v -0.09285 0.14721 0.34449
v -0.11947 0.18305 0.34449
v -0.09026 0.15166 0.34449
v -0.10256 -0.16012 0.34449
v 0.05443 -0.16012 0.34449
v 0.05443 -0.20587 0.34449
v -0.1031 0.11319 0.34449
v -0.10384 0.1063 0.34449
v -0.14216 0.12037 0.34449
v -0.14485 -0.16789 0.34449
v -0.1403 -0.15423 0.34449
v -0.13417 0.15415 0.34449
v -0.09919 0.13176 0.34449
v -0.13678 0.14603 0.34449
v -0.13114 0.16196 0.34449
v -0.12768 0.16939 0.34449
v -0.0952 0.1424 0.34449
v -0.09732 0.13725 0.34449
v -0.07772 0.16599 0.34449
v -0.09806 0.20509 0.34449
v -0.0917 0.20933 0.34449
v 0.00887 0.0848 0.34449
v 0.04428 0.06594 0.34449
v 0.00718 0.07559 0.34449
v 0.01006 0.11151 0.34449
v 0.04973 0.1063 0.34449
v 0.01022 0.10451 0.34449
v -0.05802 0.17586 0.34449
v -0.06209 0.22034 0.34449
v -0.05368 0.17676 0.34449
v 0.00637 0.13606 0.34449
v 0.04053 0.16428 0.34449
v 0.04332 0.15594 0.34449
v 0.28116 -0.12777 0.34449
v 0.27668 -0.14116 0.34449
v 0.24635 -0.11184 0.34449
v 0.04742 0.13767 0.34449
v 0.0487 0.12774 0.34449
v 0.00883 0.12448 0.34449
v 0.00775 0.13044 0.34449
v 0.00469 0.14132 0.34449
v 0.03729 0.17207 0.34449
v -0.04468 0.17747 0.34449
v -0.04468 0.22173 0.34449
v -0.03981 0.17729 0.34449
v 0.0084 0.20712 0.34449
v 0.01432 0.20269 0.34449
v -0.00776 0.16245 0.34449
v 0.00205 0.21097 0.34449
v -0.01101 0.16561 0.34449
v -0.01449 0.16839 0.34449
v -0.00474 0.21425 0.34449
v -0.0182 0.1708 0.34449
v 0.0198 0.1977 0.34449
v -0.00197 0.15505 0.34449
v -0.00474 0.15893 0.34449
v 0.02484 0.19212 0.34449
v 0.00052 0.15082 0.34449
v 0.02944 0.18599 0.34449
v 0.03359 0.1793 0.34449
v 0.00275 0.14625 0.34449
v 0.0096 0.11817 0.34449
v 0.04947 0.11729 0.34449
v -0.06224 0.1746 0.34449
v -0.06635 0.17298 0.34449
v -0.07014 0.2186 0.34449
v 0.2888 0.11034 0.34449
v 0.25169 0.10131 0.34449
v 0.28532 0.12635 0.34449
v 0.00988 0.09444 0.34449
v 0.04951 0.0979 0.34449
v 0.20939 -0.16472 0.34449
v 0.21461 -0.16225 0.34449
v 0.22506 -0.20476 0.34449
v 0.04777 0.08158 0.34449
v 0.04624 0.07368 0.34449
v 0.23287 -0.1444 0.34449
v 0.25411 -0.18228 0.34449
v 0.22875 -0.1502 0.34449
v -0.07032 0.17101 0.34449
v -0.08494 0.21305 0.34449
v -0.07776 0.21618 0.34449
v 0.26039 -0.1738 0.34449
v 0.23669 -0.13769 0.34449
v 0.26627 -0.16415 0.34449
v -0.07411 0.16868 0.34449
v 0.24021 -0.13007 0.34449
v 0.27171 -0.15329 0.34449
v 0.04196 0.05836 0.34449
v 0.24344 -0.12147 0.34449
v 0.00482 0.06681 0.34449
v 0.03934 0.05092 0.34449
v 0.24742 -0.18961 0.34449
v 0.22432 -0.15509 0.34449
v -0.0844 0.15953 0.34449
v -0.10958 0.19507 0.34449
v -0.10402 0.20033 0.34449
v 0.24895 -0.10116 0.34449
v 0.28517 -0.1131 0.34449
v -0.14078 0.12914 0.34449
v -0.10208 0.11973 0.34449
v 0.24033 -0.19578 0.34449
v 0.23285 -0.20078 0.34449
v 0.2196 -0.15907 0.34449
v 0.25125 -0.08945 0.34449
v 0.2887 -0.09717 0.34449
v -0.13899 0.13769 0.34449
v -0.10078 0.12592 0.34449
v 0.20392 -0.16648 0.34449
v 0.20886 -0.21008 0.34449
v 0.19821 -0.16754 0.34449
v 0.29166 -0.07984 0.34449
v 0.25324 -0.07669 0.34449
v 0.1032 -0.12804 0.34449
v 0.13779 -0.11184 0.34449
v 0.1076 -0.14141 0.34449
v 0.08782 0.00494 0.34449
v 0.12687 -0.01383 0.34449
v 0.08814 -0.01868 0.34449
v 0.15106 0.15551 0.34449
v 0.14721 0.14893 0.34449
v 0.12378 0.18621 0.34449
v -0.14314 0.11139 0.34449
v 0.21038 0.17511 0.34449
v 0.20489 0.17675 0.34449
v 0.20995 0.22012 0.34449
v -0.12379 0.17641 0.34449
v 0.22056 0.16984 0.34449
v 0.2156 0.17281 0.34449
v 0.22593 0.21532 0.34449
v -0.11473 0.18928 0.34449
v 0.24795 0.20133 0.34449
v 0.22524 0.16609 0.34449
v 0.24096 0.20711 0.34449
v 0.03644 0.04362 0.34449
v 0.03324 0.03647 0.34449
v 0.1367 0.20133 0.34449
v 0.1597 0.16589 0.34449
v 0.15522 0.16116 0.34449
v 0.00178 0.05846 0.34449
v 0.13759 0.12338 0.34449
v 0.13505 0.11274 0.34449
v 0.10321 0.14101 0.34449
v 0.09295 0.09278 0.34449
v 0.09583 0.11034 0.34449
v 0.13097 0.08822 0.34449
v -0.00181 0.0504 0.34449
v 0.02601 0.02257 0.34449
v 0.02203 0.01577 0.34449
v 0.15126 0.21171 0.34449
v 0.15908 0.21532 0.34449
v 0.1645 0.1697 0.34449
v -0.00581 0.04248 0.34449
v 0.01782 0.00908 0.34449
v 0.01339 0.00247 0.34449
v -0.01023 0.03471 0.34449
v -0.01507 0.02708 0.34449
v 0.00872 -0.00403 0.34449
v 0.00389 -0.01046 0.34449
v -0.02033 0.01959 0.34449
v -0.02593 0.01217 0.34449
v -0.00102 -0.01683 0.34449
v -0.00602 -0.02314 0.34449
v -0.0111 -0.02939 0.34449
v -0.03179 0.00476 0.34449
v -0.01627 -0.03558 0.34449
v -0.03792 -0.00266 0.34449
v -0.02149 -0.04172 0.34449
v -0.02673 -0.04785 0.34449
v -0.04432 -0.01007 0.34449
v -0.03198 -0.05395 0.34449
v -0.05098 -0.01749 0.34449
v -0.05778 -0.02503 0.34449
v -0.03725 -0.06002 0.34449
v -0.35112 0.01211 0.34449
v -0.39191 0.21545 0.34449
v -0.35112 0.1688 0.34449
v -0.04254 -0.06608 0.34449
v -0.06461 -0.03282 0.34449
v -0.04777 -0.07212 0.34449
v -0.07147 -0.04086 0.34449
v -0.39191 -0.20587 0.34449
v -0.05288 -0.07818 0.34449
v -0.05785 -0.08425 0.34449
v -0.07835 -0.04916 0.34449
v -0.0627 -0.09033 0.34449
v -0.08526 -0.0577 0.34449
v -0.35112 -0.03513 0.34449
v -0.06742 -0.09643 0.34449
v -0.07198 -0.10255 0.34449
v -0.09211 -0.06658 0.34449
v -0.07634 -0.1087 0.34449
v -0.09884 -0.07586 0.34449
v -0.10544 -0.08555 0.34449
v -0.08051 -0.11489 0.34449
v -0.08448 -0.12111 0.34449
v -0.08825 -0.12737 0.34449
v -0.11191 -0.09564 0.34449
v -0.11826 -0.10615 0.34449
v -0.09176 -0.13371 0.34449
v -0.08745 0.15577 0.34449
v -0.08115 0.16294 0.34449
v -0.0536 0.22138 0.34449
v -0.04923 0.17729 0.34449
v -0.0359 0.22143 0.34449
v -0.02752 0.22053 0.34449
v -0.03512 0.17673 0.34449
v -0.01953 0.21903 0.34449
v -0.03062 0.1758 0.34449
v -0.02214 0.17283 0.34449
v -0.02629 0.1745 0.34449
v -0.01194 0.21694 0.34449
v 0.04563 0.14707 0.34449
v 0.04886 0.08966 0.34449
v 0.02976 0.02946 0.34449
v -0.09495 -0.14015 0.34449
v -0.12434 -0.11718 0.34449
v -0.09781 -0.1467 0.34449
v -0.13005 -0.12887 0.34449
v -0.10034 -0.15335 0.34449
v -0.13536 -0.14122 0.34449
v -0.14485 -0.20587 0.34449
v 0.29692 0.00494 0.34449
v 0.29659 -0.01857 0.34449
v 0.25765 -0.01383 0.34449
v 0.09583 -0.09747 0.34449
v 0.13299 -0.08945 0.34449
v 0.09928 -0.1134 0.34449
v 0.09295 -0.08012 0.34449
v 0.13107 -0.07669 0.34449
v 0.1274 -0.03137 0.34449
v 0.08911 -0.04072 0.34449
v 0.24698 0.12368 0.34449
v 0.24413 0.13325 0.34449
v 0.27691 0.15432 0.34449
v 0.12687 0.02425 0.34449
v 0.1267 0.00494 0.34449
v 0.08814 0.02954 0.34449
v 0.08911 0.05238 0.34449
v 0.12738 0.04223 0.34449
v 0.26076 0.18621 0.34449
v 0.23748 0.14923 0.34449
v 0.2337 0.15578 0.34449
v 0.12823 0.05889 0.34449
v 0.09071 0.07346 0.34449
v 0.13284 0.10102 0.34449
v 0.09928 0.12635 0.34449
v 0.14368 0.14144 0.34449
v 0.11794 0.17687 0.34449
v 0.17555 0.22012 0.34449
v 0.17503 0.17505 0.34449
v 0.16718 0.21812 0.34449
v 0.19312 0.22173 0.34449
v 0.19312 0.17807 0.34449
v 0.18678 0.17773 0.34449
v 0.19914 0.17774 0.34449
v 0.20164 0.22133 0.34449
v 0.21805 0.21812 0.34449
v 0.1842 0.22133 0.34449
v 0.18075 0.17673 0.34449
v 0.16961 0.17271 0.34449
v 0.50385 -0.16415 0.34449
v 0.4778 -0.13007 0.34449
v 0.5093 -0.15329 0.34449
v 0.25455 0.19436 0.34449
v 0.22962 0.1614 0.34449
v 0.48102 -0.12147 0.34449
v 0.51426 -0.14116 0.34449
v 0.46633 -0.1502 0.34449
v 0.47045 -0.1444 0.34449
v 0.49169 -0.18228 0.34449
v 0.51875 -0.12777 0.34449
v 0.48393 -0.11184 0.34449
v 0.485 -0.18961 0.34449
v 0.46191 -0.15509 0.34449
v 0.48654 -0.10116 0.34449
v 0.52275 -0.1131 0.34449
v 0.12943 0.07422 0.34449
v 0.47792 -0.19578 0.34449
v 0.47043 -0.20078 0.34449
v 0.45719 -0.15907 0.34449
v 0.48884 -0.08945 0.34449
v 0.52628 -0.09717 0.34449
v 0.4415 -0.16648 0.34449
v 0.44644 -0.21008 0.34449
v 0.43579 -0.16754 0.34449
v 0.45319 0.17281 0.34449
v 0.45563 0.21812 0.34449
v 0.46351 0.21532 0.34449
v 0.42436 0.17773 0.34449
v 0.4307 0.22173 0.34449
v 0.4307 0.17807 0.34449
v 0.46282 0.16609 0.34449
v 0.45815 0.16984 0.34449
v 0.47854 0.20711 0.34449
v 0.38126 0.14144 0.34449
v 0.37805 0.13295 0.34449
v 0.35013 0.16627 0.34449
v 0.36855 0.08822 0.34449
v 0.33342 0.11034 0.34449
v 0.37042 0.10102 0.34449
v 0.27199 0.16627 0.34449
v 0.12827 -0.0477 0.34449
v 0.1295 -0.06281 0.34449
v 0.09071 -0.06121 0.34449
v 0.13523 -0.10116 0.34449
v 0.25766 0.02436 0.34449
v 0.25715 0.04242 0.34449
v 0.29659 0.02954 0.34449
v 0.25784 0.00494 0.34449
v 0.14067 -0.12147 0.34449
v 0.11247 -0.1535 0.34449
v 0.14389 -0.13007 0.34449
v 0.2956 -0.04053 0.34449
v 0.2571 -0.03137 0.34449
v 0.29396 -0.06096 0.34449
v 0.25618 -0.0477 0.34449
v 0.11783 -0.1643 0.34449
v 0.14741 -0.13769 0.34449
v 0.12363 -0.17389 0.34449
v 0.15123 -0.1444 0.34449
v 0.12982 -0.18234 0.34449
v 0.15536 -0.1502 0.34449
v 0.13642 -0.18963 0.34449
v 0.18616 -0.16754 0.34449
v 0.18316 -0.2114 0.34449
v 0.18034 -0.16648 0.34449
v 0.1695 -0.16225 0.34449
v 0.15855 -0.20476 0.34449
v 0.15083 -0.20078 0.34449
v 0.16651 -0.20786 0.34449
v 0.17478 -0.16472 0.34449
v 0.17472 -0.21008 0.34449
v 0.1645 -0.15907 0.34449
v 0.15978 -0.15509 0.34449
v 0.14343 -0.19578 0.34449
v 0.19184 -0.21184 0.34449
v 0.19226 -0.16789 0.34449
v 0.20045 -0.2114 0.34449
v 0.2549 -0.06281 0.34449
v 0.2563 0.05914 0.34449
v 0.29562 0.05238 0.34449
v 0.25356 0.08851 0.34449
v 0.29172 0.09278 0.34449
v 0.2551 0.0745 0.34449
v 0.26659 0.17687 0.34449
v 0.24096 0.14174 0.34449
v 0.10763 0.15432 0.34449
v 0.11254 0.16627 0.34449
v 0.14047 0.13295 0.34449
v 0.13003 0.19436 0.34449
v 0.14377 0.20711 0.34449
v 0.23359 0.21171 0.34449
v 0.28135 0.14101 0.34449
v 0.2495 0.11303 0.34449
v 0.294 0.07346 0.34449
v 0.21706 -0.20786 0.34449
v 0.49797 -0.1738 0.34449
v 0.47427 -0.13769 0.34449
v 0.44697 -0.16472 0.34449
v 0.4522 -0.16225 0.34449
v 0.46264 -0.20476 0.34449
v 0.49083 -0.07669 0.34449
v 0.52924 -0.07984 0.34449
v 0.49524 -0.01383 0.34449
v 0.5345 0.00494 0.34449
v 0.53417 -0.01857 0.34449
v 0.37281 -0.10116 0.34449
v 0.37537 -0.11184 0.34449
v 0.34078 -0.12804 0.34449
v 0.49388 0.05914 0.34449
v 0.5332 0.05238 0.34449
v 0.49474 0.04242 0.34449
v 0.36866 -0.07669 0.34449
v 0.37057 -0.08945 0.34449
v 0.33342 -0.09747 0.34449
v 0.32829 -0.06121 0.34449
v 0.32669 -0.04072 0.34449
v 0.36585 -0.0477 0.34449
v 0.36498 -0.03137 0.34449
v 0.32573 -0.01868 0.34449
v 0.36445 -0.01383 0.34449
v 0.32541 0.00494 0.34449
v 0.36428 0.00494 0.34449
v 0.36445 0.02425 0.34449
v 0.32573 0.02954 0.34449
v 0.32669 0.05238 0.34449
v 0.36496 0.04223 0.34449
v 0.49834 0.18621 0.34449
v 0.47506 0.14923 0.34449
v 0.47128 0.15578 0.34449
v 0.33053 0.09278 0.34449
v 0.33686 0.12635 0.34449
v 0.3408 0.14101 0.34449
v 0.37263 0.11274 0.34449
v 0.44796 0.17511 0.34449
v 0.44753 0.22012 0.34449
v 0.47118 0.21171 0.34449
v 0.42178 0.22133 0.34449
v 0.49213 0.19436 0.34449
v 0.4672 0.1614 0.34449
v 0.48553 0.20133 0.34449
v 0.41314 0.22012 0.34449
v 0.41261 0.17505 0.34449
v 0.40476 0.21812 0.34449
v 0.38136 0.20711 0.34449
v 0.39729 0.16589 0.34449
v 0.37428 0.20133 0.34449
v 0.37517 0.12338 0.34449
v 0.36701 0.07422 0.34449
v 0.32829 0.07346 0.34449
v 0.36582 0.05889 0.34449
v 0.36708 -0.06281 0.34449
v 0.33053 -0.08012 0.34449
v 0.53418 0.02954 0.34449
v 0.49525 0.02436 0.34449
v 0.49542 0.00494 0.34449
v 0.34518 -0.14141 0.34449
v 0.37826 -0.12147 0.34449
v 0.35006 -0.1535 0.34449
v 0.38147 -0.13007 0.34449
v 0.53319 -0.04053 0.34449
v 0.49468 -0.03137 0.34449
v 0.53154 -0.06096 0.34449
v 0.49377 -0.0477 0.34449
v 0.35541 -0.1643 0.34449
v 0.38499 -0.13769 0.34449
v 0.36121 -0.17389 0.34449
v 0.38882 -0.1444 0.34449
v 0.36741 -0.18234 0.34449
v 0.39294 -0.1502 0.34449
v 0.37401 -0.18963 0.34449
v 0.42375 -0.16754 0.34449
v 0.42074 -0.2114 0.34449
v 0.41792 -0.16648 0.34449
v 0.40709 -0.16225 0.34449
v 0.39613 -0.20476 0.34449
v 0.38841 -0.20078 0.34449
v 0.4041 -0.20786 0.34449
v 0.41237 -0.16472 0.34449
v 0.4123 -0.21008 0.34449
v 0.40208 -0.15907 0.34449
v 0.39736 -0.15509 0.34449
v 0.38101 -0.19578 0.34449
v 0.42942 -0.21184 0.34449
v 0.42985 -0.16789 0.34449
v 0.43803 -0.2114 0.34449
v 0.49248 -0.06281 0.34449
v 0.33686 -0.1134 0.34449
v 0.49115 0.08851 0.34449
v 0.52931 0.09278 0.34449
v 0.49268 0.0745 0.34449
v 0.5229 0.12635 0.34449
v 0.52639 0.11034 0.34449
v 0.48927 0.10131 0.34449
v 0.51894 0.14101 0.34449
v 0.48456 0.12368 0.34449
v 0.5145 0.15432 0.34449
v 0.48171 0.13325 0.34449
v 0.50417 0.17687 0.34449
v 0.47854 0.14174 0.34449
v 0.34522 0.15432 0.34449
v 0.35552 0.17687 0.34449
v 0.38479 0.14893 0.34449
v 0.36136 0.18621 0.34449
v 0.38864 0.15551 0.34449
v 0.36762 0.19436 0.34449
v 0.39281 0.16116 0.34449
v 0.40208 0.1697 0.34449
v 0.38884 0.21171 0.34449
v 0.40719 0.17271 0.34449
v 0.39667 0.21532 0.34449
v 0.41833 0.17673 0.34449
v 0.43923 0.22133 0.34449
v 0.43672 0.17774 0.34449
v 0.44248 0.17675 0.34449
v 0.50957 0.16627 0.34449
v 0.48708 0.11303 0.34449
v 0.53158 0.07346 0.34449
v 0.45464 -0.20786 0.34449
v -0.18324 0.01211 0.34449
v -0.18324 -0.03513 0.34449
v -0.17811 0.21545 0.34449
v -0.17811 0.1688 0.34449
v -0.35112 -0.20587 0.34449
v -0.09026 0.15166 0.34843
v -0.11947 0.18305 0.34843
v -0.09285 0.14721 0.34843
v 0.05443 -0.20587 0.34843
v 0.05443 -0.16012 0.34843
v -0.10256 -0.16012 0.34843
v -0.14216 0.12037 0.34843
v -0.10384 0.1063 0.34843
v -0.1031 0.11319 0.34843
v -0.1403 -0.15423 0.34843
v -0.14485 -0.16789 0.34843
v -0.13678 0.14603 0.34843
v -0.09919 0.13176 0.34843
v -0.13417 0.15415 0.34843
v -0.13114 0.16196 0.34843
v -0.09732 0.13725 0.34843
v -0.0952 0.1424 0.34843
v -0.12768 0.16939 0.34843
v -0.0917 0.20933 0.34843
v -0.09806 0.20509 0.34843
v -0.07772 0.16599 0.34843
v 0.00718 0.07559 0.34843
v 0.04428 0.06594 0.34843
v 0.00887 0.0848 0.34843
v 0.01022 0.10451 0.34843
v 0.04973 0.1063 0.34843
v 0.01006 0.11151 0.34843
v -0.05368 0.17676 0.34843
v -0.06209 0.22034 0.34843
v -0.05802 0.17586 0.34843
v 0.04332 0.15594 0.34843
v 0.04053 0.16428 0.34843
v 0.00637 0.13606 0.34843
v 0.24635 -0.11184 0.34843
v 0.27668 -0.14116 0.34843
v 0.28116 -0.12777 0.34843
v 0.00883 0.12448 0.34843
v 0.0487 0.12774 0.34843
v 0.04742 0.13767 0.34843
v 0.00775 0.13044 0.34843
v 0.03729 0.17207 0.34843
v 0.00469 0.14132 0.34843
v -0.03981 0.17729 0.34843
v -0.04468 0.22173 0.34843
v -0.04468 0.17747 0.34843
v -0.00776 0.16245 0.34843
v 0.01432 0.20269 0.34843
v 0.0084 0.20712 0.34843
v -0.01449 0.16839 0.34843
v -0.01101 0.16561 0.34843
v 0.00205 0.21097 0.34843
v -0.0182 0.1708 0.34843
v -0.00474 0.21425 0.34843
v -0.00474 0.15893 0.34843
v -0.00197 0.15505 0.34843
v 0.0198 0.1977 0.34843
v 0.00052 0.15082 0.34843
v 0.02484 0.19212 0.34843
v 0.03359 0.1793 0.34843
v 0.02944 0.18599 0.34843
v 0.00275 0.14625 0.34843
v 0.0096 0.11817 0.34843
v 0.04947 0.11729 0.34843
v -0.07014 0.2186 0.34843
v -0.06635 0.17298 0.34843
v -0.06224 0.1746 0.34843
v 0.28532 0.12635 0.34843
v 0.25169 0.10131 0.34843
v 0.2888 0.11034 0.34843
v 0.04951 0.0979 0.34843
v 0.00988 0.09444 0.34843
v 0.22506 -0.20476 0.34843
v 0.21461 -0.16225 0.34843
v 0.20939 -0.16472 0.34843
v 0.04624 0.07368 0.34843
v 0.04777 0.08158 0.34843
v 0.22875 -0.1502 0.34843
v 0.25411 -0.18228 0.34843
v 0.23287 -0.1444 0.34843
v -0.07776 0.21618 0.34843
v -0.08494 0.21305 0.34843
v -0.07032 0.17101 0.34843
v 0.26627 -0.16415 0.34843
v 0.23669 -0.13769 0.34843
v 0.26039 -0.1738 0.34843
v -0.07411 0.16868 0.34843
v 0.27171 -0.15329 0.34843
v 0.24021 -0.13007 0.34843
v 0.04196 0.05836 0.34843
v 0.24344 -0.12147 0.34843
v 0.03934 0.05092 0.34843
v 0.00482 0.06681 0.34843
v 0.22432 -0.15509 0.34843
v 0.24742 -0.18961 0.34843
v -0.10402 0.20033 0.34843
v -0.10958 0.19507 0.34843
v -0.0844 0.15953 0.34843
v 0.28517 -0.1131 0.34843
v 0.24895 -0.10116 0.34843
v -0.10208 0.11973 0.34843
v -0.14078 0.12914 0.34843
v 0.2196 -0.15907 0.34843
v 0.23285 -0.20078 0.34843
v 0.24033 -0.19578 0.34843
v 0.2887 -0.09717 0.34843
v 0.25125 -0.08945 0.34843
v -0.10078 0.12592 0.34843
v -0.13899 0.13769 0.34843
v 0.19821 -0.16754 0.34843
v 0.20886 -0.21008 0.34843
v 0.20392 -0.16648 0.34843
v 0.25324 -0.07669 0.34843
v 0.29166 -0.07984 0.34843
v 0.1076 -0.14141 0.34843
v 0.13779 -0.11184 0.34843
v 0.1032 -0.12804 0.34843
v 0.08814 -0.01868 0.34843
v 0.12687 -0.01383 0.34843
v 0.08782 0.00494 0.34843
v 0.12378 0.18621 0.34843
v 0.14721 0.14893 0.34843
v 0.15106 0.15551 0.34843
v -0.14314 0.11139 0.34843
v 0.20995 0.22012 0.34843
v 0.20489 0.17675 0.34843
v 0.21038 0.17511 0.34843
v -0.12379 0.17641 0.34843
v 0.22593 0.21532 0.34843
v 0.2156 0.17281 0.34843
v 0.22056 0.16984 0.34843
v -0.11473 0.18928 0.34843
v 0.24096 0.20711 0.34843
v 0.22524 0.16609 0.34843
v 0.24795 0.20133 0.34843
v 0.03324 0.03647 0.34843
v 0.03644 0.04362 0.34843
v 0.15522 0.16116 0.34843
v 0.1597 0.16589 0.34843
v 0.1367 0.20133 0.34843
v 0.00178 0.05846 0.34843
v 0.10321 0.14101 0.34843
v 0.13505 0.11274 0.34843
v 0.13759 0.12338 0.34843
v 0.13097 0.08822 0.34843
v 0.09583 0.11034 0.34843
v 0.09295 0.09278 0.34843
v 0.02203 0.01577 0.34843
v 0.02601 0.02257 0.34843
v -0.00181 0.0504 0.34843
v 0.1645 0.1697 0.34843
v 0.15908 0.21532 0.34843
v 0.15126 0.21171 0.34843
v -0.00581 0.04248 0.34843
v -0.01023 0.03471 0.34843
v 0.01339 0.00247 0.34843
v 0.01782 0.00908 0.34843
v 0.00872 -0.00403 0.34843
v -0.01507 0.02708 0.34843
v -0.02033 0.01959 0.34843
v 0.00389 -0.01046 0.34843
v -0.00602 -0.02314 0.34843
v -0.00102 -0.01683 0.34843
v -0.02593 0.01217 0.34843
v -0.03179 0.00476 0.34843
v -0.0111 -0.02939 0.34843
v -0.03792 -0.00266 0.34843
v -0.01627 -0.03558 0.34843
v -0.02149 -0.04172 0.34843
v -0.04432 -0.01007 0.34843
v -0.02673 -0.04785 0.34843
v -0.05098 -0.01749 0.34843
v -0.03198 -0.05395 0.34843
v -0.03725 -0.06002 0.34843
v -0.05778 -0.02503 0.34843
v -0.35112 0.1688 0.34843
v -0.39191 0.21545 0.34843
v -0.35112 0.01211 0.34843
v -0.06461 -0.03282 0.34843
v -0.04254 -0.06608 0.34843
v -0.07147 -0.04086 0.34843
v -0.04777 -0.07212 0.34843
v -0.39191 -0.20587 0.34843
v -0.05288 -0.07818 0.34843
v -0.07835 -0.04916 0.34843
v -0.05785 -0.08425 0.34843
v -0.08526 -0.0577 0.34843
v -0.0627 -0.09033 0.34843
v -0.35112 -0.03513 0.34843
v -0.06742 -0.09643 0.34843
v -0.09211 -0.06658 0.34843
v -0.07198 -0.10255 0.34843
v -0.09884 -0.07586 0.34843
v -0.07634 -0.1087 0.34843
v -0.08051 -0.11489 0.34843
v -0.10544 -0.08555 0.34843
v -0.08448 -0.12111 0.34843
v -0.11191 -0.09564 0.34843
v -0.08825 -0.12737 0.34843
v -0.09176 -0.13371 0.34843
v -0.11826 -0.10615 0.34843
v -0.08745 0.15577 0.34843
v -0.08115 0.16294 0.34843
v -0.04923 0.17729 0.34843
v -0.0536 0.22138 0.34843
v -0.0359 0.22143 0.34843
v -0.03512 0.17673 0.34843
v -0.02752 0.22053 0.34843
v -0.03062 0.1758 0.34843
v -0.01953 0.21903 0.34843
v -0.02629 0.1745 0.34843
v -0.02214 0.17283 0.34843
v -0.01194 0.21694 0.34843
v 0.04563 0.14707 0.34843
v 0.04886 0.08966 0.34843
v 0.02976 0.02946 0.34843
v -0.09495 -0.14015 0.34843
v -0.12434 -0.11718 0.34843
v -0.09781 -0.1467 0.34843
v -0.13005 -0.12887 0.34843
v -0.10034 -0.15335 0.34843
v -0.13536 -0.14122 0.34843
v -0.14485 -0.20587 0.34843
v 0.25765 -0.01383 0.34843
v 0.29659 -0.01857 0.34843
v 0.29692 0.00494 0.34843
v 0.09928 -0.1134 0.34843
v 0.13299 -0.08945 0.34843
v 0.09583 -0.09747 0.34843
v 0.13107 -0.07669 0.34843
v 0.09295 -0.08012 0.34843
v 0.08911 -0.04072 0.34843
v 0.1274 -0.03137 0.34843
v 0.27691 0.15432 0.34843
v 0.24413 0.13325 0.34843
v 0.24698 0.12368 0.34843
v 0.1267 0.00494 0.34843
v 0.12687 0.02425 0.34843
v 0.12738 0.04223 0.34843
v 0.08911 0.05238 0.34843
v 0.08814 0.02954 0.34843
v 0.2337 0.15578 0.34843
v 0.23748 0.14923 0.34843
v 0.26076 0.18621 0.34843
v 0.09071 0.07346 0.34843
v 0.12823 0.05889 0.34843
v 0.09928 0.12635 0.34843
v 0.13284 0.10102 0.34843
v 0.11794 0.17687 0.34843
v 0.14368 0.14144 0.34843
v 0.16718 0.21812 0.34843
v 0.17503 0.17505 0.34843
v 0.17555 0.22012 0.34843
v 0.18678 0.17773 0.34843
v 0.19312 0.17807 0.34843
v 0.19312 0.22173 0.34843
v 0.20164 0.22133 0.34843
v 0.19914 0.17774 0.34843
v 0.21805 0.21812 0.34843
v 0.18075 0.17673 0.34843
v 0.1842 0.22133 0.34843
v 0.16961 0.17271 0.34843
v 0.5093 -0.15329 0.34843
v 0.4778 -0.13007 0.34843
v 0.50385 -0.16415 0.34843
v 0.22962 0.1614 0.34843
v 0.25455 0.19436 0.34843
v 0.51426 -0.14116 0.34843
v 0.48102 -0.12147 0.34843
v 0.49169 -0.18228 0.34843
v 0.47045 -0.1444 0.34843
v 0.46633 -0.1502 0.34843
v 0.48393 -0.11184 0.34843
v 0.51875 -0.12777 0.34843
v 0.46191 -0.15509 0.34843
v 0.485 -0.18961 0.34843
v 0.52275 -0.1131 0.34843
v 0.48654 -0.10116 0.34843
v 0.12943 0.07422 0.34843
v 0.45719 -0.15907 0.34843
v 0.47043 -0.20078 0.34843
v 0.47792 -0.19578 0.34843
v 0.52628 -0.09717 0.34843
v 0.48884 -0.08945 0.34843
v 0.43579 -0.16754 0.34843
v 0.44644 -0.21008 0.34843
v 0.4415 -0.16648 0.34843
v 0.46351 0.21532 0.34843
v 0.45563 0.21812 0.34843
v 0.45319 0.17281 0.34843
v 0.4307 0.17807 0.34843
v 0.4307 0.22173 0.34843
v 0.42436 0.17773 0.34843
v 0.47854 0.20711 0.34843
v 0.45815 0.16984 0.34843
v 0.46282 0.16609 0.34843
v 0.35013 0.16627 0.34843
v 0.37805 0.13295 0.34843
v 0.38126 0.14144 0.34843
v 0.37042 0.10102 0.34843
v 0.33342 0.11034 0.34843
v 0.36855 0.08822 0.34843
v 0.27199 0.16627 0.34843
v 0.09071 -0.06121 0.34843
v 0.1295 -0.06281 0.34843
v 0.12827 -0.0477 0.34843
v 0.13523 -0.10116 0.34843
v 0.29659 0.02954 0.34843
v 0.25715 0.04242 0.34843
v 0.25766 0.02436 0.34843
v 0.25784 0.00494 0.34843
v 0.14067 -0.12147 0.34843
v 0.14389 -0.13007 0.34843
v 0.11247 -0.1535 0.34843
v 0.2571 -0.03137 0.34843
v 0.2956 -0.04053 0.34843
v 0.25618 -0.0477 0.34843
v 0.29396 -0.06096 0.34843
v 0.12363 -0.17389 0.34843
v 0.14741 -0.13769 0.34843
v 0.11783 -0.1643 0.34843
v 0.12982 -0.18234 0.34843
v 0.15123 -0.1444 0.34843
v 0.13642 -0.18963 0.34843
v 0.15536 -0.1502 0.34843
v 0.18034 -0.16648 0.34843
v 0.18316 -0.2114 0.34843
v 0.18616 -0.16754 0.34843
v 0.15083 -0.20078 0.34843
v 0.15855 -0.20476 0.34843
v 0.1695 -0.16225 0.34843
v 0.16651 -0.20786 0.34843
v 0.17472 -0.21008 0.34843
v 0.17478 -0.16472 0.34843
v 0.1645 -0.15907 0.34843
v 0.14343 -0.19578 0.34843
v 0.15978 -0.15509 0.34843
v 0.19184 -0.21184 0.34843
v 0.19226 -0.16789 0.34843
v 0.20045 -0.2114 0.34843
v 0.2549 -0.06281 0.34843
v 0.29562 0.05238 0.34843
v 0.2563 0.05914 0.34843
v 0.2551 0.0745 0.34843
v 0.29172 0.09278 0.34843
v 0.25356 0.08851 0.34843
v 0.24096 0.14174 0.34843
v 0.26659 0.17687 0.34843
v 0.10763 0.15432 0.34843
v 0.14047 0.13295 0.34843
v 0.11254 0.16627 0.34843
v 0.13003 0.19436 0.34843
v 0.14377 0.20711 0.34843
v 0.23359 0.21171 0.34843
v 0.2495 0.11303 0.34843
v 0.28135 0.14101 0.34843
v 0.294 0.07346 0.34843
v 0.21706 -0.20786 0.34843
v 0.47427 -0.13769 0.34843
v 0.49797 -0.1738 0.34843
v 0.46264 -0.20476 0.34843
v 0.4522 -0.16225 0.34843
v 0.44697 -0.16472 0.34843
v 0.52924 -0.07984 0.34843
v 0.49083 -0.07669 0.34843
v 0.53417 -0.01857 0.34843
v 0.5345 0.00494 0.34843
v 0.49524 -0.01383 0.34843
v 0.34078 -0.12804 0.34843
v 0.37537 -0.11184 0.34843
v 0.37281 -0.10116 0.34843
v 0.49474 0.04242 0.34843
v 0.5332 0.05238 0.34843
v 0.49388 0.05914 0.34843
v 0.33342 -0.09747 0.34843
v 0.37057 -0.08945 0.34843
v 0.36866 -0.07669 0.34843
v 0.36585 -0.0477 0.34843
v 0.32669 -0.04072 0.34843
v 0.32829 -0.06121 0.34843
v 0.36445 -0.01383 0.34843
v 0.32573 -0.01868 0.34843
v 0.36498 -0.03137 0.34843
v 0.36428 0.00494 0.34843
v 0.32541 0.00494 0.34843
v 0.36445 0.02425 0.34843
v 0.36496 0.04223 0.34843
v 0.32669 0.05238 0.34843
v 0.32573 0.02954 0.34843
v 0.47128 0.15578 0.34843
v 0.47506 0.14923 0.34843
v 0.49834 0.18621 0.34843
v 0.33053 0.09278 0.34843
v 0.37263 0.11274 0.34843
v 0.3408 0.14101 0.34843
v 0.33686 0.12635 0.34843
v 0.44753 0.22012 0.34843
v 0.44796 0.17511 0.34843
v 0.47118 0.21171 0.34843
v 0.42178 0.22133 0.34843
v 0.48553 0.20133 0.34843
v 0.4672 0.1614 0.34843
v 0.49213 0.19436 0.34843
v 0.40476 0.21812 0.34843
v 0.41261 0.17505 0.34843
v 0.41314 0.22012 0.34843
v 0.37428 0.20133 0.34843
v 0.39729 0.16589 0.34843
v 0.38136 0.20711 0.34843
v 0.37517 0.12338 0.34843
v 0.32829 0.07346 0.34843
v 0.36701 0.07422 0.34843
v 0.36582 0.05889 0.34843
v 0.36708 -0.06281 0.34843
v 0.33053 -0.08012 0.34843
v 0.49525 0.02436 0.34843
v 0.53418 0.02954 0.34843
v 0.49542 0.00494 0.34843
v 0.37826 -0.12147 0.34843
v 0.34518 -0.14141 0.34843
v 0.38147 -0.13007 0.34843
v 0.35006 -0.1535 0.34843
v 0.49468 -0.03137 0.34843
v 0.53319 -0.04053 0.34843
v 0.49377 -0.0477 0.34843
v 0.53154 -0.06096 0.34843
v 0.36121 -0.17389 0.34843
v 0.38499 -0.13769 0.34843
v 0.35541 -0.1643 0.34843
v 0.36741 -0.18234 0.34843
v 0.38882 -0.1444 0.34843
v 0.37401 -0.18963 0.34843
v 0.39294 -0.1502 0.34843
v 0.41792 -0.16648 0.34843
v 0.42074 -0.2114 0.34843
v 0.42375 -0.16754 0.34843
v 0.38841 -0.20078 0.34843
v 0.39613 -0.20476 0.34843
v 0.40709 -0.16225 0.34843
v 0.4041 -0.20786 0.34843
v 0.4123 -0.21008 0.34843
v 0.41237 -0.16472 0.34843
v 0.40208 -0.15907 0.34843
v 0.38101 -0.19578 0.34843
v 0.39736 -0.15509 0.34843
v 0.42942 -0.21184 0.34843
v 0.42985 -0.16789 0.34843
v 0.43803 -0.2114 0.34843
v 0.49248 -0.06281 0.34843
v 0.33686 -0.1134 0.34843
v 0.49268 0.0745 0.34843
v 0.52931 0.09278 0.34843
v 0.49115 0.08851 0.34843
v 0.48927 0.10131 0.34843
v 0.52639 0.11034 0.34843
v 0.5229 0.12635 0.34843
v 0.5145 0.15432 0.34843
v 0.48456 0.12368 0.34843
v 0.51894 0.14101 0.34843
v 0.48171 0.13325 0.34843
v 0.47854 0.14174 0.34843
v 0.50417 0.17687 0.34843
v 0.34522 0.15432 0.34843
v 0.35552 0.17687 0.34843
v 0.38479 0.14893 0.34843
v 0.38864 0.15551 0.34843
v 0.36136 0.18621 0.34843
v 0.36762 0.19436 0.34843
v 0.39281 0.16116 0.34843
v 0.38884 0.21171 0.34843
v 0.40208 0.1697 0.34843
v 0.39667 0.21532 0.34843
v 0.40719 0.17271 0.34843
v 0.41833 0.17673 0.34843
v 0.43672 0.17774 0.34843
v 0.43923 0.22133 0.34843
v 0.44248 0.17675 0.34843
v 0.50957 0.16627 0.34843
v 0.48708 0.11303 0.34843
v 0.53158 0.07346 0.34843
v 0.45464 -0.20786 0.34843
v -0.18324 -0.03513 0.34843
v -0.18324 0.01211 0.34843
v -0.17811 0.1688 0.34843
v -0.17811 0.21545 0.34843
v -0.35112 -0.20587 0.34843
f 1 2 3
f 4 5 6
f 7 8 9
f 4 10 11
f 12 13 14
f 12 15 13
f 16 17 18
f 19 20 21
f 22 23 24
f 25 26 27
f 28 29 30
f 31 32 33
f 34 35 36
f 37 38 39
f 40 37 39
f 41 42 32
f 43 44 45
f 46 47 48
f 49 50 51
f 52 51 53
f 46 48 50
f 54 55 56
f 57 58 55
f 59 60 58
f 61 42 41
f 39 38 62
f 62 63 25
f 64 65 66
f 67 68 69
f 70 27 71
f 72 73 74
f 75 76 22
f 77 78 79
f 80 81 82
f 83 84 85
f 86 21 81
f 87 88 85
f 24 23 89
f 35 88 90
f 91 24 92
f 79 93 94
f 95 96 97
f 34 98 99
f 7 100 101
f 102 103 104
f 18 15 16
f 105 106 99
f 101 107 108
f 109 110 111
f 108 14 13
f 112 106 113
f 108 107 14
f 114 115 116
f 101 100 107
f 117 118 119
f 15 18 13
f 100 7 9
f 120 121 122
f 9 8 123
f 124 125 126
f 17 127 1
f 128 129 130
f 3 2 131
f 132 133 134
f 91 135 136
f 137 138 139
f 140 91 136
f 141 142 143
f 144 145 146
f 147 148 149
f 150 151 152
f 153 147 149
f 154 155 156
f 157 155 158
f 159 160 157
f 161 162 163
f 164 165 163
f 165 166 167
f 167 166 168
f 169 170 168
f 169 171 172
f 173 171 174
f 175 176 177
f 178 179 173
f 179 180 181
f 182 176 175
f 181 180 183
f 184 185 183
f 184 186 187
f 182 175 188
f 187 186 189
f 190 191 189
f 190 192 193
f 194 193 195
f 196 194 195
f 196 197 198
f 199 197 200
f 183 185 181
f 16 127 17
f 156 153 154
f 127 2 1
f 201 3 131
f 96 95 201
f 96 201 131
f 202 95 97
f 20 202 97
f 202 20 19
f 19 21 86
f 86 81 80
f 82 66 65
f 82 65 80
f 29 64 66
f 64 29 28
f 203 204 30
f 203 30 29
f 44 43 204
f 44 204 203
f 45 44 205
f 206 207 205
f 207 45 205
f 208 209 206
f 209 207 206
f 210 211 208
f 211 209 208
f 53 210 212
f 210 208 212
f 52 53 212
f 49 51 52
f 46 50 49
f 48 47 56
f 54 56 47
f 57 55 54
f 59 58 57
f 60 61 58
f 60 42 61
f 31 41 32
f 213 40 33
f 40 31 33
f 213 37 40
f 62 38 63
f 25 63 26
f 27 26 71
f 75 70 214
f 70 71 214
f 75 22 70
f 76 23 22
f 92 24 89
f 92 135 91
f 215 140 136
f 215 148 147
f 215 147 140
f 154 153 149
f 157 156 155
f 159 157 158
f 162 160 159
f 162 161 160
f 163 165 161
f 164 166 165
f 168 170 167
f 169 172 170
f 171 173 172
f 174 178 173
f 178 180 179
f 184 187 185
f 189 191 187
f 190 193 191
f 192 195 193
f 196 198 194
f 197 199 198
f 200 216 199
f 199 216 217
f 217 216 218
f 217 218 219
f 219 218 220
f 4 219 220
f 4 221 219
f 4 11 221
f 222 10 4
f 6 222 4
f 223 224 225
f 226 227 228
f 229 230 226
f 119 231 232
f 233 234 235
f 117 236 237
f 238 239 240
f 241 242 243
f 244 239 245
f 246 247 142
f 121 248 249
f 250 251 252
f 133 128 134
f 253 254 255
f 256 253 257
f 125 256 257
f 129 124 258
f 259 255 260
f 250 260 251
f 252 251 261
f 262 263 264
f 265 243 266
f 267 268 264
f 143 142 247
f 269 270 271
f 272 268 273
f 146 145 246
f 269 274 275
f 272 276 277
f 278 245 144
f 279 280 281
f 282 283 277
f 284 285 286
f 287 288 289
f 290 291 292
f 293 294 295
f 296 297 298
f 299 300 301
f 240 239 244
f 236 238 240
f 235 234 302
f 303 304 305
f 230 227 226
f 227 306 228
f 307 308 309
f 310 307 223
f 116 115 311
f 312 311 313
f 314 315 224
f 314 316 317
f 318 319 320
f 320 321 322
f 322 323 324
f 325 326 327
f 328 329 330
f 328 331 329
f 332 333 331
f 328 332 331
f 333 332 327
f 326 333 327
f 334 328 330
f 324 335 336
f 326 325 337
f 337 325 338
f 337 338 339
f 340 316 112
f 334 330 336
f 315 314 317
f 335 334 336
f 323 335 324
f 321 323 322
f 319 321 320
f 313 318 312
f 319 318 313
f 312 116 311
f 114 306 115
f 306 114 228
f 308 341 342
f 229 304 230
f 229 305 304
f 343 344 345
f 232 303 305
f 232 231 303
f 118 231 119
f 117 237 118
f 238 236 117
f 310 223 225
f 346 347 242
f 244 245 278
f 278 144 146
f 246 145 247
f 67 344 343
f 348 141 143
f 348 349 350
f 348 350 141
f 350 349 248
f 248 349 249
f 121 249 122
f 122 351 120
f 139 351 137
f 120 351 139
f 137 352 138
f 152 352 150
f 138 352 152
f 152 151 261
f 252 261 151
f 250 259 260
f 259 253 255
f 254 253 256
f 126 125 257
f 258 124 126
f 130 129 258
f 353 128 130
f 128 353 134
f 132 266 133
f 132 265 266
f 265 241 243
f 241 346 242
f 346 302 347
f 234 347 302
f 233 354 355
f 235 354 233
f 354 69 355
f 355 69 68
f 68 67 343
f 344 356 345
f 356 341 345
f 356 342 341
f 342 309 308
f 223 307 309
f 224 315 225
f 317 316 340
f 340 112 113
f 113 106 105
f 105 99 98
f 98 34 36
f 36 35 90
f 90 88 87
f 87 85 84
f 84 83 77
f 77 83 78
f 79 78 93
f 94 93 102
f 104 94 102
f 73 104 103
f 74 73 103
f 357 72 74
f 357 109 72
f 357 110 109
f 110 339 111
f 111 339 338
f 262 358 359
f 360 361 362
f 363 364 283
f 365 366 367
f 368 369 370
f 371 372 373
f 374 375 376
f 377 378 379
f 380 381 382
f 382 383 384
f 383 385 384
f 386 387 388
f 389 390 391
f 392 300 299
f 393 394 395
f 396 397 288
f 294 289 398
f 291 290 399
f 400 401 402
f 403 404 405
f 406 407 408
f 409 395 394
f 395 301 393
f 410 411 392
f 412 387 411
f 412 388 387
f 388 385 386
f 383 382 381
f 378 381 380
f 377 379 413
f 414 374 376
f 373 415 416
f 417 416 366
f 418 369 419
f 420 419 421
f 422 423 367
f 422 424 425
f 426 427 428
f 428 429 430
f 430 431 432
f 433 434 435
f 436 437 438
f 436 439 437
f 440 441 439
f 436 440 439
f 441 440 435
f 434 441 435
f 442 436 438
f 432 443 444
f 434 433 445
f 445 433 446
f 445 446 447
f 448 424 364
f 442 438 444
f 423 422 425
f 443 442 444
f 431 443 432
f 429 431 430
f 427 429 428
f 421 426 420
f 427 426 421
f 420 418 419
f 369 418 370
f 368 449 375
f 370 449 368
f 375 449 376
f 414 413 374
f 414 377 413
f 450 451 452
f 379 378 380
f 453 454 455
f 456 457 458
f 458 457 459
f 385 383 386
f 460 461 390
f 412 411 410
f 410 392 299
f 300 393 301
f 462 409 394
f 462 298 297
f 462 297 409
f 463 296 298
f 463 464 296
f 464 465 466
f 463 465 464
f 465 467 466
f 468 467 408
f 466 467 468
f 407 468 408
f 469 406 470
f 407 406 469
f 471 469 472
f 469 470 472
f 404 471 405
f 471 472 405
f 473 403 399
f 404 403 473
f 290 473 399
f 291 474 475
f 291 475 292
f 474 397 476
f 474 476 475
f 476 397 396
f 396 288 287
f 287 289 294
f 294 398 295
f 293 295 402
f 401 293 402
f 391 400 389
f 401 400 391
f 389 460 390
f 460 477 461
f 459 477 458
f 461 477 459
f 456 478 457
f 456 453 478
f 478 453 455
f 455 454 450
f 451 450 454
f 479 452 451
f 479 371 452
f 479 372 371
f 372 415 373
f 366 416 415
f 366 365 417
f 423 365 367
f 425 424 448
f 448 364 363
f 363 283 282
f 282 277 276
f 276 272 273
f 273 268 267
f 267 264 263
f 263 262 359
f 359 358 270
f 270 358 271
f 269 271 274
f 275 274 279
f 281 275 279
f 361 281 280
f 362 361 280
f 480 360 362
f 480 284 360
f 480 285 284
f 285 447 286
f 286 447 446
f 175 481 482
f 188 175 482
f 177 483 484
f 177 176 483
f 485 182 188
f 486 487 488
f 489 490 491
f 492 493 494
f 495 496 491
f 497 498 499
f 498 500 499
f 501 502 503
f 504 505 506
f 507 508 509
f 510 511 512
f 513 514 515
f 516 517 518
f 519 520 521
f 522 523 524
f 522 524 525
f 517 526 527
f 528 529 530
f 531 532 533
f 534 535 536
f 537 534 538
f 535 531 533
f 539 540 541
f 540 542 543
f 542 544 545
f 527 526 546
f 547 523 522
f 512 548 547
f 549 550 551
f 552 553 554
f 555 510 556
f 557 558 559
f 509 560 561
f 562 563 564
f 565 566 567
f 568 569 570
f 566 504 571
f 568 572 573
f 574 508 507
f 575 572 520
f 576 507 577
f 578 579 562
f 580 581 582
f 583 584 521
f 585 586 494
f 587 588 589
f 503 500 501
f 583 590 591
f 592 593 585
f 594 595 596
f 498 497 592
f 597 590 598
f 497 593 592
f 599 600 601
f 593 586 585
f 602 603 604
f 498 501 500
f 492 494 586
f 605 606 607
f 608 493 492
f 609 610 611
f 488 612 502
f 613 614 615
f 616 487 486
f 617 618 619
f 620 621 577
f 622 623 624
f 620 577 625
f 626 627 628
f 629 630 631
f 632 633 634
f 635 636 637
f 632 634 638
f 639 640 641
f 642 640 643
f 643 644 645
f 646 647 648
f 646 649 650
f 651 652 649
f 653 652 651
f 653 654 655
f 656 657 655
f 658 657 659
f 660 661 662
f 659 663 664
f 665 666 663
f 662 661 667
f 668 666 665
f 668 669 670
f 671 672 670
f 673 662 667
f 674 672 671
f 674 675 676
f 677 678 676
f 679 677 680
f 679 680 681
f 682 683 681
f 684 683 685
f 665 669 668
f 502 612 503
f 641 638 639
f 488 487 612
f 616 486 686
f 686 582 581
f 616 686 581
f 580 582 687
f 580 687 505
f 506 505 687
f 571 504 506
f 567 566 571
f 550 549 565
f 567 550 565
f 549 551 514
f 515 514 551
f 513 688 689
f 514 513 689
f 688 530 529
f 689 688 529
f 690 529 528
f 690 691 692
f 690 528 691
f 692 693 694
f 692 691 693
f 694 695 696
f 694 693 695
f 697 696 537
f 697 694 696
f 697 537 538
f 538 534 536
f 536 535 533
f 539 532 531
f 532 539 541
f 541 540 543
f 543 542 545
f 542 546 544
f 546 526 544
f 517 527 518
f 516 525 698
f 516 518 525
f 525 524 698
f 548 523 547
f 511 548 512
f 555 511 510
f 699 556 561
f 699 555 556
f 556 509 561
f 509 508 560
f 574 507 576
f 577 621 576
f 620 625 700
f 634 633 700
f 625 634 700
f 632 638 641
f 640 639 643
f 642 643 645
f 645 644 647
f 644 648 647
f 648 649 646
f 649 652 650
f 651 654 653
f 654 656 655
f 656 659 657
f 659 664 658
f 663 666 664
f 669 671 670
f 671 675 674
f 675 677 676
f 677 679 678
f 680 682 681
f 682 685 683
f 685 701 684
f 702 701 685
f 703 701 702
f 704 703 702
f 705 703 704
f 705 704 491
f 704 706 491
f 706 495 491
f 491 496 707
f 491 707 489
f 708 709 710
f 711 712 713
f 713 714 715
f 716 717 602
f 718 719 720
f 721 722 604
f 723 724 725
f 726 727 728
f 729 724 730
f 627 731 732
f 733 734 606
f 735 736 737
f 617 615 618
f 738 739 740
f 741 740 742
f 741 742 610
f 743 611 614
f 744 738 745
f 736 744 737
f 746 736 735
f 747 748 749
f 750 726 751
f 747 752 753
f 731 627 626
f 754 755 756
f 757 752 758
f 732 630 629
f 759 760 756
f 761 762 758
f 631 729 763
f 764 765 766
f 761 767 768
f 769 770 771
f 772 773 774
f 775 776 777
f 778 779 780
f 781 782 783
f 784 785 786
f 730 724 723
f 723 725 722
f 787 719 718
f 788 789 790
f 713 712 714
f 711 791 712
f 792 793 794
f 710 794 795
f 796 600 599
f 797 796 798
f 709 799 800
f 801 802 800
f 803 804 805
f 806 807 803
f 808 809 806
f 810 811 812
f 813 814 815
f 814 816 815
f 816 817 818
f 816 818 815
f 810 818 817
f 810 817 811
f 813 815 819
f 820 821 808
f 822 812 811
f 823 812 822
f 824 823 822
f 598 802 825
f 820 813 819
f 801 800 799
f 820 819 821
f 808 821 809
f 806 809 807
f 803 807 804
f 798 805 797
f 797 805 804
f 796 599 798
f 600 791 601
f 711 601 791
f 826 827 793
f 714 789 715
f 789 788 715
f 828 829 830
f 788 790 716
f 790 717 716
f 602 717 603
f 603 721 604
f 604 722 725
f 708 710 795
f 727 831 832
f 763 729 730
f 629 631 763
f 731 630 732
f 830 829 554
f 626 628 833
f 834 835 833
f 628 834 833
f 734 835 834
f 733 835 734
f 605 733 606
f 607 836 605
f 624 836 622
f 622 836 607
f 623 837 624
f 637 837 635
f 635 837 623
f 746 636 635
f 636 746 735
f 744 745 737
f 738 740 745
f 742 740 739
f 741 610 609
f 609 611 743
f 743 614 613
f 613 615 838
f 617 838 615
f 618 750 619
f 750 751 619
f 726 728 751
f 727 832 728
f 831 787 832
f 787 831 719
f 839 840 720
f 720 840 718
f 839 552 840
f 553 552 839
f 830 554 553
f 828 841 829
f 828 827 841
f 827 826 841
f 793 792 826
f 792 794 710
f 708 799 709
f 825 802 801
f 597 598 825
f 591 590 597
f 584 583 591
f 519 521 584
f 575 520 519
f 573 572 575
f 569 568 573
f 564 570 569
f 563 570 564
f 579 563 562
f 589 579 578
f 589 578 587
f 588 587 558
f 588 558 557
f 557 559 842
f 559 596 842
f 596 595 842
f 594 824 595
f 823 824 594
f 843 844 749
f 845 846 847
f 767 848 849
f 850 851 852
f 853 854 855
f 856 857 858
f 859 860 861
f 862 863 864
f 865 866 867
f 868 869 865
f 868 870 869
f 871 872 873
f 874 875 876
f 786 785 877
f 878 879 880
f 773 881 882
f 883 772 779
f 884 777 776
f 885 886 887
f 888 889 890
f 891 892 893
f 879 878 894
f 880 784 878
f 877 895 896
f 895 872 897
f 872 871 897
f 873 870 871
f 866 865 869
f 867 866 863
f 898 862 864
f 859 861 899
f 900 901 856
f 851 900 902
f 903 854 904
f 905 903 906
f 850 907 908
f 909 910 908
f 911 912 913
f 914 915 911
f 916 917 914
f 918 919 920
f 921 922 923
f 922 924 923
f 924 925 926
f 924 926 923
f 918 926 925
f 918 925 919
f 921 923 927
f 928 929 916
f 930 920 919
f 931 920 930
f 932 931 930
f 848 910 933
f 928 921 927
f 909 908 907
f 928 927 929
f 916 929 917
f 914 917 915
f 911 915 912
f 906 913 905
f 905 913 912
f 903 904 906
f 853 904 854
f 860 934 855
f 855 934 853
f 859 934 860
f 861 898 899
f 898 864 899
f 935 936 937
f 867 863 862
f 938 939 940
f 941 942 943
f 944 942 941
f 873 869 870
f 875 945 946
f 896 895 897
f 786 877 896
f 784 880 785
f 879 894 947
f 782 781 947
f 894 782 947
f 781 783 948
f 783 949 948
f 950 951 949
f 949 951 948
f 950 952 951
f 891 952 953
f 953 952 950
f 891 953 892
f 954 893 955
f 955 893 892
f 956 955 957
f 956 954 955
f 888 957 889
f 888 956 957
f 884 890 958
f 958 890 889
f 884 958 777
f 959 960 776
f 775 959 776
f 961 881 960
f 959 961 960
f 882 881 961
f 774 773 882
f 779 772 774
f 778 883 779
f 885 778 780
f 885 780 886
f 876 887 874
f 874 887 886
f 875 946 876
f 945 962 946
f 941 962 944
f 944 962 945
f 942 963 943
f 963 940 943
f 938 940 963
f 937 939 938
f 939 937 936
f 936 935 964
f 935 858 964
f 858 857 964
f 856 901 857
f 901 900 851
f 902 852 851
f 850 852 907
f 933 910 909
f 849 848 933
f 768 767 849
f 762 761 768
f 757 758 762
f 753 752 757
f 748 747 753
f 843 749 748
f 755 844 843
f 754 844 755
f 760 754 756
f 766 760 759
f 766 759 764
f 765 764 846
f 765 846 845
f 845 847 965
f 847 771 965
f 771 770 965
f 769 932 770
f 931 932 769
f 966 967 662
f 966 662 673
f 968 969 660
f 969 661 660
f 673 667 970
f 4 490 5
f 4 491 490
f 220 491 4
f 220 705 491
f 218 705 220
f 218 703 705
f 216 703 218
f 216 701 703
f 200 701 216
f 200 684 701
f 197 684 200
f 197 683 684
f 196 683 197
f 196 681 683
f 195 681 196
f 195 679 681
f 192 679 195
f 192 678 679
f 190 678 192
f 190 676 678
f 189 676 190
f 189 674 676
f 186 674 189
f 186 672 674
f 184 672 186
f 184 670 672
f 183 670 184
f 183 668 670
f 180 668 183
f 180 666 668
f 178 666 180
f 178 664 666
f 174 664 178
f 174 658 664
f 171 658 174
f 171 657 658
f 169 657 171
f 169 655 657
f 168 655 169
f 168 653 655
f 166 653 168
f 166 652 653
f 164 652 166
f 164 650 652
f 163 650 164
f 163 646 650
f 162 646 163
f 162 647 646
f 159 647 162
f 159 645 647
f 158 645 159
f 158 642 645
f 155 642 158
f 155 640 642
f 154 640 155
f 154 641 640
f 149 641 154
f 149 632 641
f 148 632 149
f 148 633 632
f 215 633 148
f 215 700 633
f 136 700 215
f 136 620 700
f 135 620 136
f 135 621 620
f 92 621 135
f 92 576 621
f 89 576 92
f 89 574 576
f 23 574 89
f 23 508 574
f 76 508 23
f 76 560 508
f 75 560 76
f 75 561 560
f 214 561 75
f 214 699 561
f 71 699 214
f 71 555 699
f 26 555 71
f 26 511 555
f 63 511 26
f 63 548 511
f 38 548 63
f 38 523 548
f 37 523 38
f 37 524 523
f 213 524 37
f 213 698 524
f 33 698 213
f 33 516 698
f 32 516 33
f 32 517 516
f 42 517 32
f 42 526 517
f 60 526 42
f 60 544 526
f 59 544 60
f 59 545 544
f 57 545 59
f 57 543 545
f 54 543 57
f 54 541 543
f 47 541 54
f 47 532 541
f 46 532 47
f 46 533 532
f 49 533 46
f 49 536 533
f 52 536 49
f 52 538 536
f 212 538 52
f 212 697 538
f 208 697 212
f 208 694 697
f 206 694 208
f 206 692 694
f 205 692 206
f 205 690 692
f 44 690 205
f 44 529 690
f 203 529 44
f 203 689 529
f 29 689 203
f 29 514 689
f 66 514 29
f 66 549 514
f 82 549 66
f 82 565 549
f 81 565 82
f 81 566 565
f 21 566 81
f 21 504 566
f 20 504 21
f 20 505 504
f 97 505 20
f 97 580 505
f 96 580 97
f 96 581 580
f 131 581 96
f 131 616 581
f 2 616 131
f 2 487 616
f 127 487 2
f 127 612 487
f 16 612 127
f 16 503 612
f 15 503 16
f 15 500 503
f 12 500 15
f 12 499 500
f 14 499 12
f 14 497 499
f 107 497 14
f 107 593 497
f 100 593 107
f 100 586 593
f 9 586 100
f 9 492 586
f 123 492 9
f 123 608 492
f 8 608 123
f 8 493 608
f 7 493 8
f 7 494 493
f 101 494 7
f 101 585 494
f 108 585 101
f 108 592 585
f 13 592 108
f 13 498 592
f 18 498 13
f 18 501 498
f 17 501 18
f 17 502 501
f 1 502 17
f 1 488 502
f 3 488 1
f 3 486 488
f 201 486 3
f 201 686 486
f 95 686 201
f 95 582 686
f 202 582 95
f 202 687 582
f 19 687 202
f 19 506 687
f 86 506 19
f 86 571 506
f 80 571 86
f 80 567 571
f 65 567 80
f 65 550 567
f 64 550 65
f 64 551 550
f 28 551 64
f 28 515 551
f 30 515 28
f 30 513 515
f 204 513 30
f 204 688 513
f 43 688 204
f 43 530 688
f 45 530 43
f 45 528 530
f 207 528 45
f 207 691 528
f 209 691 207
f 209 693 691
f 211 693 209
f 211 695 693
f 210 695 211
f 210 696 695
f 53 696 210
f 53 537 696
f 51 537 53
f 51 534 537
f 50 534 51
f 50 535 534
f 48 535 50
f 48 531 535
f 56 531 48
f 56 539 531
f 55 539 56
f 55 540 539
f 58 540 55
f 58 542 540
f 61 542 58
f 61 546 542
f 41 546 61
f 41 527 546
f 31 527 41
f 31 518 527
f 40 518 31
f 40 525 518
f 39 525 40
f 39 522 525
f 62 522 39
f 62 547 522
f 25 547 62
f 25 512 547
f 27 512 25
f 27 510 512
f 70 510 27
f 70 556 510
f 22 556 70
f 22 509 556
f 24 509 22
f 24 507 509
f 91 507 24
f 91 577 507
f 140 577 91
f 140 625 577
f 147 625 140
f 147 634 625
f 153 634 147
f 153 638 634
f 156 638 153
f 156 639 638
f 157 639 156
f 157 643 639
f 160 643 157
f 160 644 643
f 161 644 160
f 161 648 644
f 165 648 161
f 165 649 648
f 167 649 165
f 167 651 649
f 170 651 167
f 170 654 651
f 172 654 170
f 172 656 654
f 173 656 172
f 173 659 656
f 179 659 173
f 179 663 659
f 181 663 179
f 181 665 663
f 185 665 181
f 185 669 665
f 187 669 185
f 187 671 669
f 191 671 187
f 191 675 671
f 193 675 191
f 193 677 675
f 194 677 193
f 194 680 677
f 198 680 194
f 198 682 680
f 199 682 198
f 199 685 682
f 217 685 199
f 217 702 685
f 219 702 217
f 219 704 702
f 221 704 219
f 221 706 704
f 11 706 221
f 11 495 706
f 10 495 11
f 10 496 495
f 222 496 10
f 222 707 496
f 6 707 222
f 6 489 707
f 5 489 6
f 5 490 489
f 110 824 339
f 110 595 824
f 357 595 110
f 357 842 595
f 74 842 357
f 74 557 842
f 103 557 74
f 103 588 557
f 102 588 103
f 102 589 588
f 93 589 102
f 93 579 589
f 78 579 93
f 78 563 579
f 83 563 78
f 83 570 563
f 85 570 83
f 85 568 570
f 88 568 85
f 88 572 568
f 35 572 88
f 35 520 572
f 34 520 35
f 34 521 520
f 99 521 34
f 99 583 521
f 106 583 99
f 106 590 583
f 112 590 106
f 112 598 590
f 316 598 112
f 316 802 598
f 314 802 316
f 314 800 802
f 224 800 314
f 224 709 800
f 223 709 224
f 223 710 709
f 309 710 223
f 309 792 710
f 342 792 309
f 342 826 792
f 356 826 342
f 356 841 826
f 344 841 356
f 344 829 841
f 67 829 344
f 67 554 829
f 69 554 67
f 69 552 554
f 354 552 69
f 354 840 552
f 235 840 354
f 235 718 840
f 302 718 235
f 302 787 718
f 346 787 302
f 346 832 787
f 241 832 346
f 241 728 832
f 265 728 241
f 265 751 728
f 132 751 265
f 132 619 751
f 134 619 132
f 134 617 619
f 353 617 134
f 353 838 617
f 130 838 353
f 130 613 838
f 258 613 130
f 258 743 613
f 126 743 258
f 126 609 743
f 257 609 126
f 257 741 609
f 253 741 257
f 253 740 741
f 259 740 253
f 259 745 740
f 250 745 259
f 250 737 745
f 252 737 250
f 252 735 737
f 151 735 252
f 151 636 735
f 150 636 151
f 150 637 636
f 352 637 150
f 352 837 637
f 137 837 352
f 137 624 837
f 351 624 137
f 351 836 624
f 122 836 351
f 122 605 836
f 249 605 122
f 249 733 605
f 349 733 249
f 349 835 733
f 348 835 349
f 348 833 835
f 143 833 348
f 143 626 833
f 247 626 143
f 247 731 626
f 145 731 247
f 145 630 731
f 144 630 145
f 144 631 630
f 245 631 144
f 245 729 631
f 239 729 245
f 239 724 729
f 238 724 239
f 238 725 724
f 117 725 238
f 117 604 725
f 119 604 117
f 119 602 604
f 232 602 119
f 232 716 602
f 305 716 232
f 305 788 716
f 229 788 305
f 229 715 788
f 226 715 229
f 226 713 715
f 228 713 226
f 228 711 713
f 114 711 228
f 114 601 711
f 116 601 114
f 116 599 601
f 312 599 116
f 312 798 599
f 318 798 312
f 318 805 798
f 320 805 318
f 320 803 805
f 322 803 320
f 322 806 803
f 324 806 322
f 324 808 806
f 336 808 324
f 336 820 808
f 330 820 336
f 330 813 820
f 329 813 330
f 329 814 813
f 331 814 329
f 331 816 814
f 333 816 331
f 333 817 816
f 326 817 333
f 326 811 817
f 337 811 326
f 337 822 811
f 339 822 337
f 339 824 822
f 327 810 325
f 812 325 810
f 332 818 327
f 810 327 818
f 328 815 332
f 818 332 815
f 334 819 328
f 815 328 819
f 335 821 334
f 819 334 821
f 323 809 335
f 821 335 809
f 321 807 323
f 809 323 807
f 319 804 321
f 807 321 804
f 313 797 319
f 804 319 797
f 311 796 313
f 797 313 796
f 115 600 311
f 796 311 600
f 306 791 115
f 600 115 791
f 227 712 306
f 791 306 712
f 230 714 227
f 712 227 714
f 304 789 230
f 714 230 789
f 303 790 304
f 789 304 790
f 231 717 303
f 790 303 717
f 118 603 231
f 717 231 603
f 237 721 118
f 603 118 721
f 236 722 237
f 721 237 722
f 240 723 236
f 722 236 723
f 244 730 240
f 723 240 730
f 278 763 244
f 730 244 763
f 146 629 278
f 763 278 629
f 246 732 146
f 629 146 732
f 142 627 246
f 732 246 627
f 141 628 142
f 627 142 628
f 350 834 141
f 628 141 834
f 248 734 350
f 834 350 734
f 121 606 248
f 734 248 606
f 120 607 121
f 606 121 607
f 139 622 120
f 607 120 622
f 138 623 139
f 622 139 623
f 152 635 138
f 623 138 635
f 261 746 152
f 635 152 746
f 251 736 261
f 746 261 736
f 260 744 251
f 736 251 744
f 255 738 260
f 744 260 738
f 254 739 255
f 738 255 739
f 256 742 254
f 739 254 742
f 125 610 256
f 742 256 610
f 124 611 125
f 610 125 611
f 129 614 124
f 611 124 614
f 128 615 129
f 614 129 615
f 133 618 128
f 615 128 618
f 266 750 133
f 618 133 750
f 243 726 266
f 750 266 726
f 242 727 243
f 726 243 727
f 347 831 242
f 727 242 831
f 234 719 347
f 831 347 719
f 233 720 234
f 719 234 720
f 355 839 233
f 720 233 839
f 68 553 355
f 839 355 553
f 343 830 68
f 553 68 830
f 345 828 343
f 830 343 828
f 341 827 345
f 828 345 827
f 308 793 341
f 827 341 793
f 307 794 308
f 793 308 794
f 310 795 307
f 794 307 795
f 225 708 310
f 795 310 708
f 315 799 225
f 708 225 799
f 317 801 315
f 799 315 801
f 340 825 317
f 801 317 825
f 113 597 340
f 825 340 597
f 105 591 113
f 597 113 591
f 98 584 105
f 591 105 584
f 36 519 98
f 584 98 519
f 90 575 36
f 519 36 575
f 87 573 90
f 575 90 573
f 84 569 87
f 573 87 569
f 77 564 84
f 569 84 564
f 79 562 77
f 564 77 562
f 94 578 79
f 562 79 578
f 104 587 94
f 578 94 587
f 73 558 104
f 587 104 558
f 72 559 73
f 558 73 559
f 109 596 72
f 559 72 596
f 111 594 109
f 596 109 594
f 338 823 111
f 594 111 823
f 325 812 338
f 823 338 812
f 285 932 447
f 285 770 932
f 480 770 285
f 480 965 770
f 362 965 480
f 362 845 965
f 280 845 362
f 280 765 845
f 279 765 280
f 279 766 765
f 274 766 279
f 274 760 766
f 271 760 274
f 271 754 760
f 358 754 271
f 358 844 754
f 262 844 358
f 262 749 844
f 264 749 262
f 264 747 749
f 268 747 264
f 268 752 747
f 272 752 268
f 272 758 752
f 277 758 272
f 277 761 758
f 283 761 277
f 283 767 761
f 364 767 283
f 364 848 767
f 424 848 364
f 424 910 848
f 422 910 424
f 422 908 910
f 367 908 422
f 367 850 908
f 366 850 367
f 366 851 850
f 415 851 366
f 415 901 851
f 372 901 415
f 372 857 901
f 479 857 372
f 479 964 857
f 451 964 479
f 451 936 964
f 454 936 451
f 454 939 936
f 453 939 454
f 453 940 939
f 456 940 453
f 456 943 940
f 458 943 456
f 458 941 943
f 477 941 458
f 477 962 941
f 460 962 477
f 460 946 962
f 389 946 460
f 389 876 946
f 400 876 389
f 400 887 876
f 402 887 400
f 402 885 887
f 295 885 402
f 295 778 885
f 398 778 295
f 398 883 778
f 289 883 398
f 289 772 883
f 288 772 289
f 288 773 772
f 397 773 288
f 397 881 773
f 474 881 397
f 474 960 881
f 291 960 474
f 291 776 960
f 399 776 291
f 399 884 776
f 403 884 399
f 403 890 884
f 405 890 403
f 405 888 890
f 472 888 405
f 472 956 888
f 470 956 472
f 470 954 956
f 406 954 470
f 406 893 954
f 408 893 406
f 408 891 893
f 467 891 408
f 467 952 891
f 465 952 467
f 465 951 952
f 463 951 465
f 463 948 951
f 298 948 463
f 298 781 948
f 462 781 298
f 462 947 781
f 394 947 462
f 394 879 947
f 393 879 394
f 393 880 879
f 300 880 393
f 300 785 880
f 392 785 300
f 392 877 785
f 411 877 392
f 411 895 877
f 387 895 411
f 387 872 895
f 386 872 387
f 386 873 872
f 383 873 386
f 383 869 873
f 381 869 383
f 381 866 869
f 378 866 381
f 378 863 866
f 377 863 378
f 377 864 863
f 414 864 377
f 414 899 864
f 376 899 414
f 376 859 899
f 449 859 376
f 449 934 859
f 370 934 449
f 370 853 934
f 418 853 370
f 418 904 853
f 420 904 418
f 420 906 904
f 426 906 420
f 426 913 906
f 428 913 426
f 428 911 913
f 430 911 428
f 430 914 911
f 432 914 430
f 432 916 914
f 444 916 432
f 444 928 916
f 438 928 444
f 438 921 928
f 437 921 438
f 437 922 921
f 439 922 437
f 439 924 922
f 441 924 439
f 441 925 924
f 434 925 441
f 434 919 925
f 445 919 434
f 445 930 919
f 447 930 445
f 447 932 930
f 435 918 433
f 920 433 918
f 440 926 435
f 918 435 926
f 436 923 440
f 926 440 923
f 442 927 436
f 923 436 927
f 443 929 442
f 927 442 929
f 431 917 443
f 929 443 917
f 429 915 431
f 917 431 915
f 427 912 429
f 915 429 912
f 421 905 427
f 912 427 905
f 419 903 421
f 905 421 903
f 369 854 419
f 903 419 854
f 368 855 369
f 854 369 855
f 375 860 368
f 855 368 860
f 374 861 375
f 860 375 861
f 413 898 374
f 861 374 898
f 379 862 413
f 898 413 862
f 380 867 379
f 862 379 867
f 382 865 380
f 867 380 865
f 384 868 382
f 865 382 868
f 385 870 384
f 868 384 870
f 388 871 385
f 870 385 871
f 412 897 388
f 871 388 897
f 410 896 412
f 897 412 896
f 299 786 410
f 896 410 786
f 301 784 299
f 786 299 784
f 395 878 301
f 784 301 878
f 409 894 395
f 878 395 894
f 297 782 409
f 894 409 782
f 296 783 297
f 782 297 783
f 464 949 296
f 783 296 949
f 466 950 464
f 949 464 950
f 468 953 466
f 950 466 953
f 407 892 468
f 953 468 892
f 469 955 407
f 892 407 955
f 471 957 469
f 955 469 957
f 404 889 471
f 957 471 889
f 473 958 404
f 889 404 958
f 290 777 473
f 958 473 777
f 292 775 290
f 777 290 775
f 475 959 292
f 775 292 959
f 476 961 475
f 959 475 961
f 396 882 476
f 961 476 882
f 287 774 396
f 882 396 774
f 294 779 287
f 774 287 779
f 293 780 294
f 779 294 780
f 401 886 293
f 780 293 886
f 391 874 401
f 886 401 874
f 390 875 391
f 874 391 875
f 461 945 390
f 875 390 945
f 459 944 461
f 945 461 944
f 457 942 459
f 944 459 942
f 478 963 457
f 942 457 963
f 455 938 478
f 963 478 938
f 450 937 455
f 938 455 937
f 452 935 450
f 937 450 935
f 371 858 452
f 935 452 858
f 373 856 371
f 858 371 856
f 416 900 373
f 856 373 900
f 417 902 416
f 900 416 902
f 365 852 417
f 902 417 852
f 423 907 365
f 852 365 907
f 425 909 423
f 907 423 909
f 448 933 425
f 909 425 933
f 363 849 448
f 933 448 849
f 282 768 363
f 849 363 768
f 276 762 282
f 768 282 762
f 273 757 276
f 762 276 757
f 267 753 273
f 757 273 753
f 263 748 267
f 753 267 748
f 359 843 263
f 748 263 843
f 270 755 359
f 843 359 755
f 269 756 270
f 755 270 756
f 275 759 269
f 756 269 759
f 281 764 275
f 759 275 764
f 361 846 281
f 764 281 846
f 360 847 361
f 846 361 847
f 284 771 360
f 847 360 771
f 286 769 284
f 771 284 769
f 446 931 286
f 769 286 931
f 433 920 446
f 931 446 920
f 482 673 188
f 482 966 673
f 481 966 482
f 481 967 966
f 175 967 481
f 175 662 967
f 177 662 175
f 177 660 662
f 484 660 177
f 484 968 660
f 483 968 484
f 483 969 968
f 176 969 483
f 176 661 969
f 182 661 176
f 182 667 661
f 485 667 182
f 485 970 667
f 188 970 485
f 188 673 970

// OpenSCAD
// file: defines.scad
A = 4.55;   // 4.37...4.73
B = 3.24;   // 3.07...3.41
C = 0.875;  // 0.55...1.20
D = 0.6;    // 0.25...0.95
E = 0.45;   // 0.25...0.65

pt = 0.1; // Толщина элеметов (дорожек, краски и т.п)
lab_mark = 0.3; // Полоска

$fn = 32;

scale = 1/2.54;
// main file
include <defines.scad>

font = "Liberation Sans";
/*font = "DejaVu";*/
/*font = "Abyssinica SIL";*/

fscale = 0.08;

// Label
scale(scale) color("White") rotate([0,0,0]) {
  translate([lab_mark/2, 0, C]) {
    scale([fscale,fscale*1.4,1])
    linear_extrude(height = 0.01, center=false) {
      text("F200", font = font, valign="center", halign="center");
    }
  }
}
